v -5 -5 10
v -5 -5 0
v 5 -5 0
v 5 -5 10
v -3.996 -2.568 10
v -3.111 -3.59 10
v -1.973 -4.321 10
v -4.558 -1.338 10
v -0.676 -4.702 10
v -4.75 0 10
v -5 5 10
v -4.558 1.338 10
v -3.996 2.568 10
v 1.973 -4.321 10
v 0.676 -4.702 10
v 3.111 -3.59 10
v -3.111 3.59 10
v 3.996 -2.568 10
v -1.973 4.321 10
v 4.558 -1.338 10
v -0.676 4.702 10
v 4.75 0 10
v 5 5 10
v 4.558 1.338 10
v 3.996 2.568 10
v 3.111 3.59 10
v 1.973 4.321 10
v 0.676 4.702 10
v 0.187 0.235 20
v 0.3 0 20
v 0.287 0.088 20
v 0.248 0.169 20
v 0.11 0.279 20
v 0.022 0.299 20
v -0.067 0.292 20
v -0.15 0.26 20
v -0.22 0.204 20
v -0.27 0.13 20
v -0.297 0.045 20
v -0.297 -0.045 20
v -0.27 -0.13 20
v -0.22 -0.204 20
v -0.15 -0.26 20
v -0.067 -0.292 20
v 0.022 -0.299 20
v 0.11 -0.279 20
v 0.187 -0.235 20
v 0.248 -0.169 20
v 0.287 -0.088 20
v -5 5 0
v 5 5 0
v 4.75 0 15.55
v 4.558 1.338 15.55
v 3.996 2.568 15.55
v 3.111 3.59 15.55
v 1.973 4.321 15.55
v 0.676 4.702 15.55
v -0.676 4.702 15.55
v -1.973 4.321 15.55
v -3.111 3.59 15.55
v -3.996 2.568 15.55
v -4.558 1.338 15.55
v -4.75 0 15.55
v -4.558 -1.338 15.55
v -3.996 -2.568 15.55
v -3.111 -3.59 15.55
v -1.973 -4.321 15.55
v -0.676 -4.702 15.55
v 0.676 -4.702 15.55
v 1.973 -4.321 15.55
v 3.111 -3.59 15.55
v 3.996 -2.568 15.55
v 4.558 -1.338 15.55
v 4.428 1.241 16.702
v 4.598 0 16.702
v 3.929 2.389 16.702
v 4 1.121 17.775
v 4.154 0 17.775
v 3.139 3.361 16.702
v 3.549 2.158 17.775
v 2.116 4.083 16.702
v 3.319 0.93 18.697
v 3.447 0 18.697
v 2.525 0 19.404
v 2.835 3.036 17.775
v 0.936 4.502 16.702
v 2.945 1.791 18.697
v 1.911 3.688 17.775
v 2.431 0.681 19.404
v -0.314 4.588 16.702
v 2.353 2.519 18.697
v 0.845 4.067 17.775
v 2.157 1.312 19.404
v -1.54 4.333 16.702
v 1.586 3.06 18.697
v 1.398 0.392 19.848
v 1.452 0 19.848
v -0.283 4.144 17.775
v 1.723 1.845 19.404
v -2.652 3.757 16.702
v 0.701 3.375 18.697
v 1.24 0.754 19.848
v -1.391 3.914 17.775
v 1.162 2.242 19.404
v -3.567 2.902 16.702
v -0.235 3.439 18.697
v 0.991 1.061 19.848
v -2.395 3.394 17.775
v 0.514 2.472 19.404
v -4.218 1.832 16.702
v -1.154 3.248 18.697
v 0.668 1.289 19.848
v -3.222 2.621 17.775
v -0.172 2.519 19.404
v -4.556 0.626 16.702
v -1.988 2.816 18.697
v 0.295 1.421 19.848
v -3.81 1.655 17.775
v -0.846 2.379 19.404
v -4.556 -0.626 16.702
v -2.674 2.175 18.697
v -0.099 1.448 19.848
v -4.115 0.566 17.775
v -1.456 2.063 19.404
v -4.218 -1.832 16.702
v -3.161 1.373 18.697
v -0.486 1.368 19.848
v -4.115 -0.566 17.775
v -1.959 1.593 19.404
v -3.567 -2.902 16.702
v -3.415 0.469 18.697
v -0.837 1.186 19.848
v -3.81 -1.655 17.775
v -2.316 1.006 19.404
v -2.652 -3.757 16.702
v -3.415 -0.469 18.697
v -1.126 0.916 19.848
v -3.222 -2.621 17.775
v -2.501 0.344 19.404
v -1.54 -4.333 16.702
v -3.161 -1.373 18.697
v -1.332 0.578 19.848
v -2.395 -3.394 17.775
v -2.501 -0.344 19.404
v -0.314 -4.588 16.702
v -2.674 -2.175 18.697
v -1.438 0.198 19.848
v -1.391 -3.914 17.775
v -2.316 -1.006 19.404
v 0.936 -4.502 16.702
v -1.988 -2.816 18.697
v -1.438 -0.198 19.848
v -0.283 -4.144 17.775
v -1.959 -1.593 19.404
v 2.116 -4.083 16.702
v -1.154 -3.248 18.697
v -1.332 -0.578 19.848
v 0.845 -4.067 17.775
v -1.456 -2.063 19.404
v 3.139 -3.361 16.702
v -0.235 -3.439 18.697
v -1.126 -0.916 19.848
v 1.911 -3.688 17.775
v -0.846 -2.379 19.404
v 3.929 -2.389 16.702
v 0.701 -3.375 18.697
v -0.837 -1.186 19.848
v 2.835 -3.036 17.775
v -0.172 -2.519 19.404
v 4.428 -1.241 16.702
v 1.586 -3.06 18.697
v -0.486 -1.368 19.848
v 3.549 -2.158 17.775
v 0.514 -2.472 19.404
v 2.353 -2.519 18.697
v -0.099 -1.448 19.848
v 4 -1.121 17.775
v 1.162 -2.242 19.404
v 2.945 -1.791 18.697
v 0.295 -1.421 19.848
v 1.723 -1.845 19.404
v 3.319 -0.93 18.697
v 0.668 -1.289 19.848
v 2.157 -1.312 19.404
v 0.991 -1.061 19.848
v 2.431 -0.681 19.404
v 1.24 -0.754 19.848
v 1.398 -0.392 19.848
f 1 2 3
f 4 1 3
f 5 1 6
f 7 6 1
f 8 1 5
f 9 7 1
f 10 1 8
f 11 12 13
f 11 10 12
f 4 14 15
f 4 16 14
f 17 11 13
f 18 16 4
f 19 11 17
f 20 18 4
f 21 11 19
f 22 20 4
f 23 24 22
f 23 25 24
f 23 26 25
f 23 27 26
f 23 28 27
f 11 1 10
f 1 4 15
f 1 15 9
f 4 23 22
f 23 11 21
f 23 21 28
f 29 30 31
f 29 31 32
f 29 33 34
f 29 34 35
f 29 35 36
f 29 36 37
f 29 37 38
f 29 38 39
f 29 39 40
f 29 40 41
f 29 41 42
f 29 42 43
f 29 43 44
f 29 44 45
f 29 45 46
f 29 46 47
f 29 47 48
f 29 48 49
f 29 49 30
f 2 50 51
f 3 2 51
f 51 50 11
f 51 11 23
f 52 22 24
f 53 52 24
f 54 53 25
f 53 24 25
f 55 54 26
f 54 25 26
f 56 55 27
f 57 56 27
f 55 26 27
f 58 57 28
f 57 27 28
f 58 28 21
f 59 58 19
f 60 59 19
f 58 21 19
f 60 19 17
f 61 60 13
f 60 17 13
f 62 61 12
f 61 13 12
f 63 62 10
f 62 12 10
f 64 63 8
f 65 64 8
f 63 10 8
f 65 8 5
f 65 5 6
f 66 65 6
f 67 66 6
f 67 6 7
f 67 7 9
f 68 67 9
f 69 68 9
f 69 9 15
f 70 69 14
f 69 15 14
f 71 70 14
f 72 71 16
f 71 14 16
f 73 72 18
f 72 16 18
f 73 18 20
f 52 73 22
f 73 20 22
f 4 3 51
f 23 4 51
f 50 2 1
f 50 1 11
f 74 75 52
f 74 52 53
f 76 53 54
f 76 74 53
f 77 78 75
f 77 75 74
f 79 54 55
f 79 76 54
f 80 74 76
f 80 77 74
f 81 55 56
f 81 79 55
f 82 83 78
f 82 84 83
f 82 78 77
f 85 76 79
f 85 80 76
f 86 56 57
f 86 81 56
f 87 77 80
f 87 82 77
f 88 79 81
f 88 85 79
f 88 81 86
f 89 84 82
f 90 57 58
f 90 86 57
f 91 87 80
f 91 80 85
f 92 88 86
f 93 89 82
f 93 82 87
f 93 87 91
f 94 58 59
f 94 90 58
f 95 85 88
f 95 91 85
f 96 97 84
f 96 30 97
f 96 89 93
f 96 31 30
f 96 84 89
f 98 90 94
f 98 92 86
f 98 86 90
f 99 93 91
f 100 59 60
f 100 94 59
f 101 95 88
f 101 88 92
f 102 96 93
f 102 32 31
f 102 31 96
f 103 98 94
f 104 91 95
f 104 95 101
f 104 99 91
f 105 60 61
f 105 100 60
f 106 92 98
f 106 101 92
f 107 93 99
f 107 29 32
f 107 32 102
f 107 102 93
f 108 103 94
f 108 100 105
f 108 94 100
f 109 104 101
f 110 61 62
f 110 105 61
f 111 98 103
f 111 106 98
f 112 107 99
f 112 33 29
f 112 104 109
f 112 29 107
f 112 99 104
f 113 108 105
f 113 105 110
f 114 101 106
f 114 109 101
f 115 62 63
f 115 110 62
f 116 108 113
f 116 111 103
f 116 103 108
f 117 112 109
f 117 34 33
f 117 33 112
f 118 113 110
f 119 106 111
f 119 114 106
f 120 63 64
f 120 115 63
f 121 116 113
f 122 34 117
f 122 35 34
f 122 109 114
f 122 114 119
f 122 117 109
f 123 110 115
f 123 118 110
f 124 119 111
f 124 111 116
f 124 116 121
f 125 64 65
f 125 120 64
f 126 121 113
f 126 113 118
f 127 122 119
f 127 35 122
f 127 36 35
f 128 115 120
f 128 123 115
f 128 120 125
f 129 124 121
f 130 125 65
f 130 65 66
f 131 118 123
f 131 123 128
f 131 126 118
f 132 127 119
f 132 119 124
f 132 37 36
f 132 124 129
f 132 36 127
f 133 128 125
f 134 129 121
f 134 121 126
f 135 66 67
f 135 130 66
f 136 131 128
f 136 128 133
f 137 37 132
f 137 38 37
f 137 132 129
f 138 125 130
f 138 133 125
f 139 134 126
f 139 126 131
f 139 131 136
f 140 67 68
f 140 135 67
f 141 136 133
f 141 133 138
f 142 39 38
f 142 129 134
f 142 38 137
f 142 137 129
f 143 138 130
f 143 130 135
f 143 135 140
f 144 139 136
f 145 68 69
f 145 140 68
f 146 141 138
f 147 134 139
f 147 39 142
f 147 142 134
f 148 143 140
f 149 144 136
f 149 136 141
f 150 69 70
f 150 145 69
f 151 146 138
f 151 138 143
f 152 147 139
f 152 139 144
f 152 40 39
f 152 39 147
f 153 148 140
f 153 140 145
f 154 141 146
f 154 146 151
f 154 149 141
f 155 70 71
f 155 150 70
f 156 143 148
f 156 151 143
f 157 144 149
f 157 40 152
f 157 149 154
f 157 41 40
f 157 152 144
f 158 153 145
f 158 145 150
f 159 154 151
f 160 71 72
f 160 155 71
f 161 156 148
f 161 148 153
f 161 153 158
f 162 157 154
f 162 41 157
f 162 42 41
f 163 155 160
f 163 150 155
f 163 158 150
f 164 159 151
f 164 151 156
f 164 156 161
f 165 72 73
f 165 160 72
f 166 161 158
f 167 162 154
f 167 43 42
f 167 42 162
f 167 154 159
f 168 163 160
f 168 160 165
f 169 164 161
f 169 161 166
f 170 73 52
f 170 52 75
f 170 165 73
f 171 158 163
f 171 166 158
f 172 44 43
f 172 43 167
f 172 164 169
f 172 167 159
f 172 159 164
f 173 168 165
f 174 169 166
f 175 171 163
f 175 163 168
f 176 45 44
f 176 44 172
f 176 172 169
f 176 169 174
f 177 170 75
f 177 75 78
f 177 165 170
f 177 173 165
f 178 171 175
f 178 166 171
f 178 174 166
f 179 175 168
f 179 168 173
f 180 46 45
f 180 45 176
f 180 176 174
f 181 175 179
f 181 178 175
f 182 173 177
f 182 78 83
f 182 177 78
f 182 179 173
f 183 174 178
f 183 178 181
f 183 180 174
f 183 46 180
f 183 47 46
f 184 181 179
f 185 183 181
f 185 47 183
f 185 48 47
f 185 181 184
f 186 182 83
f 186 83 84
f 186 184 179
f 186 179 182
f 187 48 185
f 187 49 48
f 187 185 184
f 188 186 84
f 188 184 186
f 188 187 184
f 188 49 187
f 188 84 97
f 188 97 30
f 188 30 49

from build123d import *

# Parameters (mm, degrees)
SKETCH_W     = 10
SKETCH_H     = 10
PAD_DEPTH    = 10
SKETCH001_R  = 4.75
PAD001_DEPTH = 10
FILLET_R     = 4.45


with BuildPart() as part:
    # Sketch → Pad (new body)
    with BuildSketch(Plane.XY):
        Rectangle(SKETCH_W, SKETCH_H)
    extrude(amount=PAD_DEPTH)

    # Sketch001 (on Face6 of Pad) → Pad001 (join)
    with BuildSketch(Plane.XY.offset(10)):
        Circle(SKETCH001_R)
    extrude(amount=PAD001_DEPTH)

    # Fillet
    fillet_edges = [part.edges().sort_by_distance(p)[0] for p in [
        (-4.75, 0, 20),
    ]]
    fillet(fillet_edges, radius=FILLET_R)


solid = part.part
